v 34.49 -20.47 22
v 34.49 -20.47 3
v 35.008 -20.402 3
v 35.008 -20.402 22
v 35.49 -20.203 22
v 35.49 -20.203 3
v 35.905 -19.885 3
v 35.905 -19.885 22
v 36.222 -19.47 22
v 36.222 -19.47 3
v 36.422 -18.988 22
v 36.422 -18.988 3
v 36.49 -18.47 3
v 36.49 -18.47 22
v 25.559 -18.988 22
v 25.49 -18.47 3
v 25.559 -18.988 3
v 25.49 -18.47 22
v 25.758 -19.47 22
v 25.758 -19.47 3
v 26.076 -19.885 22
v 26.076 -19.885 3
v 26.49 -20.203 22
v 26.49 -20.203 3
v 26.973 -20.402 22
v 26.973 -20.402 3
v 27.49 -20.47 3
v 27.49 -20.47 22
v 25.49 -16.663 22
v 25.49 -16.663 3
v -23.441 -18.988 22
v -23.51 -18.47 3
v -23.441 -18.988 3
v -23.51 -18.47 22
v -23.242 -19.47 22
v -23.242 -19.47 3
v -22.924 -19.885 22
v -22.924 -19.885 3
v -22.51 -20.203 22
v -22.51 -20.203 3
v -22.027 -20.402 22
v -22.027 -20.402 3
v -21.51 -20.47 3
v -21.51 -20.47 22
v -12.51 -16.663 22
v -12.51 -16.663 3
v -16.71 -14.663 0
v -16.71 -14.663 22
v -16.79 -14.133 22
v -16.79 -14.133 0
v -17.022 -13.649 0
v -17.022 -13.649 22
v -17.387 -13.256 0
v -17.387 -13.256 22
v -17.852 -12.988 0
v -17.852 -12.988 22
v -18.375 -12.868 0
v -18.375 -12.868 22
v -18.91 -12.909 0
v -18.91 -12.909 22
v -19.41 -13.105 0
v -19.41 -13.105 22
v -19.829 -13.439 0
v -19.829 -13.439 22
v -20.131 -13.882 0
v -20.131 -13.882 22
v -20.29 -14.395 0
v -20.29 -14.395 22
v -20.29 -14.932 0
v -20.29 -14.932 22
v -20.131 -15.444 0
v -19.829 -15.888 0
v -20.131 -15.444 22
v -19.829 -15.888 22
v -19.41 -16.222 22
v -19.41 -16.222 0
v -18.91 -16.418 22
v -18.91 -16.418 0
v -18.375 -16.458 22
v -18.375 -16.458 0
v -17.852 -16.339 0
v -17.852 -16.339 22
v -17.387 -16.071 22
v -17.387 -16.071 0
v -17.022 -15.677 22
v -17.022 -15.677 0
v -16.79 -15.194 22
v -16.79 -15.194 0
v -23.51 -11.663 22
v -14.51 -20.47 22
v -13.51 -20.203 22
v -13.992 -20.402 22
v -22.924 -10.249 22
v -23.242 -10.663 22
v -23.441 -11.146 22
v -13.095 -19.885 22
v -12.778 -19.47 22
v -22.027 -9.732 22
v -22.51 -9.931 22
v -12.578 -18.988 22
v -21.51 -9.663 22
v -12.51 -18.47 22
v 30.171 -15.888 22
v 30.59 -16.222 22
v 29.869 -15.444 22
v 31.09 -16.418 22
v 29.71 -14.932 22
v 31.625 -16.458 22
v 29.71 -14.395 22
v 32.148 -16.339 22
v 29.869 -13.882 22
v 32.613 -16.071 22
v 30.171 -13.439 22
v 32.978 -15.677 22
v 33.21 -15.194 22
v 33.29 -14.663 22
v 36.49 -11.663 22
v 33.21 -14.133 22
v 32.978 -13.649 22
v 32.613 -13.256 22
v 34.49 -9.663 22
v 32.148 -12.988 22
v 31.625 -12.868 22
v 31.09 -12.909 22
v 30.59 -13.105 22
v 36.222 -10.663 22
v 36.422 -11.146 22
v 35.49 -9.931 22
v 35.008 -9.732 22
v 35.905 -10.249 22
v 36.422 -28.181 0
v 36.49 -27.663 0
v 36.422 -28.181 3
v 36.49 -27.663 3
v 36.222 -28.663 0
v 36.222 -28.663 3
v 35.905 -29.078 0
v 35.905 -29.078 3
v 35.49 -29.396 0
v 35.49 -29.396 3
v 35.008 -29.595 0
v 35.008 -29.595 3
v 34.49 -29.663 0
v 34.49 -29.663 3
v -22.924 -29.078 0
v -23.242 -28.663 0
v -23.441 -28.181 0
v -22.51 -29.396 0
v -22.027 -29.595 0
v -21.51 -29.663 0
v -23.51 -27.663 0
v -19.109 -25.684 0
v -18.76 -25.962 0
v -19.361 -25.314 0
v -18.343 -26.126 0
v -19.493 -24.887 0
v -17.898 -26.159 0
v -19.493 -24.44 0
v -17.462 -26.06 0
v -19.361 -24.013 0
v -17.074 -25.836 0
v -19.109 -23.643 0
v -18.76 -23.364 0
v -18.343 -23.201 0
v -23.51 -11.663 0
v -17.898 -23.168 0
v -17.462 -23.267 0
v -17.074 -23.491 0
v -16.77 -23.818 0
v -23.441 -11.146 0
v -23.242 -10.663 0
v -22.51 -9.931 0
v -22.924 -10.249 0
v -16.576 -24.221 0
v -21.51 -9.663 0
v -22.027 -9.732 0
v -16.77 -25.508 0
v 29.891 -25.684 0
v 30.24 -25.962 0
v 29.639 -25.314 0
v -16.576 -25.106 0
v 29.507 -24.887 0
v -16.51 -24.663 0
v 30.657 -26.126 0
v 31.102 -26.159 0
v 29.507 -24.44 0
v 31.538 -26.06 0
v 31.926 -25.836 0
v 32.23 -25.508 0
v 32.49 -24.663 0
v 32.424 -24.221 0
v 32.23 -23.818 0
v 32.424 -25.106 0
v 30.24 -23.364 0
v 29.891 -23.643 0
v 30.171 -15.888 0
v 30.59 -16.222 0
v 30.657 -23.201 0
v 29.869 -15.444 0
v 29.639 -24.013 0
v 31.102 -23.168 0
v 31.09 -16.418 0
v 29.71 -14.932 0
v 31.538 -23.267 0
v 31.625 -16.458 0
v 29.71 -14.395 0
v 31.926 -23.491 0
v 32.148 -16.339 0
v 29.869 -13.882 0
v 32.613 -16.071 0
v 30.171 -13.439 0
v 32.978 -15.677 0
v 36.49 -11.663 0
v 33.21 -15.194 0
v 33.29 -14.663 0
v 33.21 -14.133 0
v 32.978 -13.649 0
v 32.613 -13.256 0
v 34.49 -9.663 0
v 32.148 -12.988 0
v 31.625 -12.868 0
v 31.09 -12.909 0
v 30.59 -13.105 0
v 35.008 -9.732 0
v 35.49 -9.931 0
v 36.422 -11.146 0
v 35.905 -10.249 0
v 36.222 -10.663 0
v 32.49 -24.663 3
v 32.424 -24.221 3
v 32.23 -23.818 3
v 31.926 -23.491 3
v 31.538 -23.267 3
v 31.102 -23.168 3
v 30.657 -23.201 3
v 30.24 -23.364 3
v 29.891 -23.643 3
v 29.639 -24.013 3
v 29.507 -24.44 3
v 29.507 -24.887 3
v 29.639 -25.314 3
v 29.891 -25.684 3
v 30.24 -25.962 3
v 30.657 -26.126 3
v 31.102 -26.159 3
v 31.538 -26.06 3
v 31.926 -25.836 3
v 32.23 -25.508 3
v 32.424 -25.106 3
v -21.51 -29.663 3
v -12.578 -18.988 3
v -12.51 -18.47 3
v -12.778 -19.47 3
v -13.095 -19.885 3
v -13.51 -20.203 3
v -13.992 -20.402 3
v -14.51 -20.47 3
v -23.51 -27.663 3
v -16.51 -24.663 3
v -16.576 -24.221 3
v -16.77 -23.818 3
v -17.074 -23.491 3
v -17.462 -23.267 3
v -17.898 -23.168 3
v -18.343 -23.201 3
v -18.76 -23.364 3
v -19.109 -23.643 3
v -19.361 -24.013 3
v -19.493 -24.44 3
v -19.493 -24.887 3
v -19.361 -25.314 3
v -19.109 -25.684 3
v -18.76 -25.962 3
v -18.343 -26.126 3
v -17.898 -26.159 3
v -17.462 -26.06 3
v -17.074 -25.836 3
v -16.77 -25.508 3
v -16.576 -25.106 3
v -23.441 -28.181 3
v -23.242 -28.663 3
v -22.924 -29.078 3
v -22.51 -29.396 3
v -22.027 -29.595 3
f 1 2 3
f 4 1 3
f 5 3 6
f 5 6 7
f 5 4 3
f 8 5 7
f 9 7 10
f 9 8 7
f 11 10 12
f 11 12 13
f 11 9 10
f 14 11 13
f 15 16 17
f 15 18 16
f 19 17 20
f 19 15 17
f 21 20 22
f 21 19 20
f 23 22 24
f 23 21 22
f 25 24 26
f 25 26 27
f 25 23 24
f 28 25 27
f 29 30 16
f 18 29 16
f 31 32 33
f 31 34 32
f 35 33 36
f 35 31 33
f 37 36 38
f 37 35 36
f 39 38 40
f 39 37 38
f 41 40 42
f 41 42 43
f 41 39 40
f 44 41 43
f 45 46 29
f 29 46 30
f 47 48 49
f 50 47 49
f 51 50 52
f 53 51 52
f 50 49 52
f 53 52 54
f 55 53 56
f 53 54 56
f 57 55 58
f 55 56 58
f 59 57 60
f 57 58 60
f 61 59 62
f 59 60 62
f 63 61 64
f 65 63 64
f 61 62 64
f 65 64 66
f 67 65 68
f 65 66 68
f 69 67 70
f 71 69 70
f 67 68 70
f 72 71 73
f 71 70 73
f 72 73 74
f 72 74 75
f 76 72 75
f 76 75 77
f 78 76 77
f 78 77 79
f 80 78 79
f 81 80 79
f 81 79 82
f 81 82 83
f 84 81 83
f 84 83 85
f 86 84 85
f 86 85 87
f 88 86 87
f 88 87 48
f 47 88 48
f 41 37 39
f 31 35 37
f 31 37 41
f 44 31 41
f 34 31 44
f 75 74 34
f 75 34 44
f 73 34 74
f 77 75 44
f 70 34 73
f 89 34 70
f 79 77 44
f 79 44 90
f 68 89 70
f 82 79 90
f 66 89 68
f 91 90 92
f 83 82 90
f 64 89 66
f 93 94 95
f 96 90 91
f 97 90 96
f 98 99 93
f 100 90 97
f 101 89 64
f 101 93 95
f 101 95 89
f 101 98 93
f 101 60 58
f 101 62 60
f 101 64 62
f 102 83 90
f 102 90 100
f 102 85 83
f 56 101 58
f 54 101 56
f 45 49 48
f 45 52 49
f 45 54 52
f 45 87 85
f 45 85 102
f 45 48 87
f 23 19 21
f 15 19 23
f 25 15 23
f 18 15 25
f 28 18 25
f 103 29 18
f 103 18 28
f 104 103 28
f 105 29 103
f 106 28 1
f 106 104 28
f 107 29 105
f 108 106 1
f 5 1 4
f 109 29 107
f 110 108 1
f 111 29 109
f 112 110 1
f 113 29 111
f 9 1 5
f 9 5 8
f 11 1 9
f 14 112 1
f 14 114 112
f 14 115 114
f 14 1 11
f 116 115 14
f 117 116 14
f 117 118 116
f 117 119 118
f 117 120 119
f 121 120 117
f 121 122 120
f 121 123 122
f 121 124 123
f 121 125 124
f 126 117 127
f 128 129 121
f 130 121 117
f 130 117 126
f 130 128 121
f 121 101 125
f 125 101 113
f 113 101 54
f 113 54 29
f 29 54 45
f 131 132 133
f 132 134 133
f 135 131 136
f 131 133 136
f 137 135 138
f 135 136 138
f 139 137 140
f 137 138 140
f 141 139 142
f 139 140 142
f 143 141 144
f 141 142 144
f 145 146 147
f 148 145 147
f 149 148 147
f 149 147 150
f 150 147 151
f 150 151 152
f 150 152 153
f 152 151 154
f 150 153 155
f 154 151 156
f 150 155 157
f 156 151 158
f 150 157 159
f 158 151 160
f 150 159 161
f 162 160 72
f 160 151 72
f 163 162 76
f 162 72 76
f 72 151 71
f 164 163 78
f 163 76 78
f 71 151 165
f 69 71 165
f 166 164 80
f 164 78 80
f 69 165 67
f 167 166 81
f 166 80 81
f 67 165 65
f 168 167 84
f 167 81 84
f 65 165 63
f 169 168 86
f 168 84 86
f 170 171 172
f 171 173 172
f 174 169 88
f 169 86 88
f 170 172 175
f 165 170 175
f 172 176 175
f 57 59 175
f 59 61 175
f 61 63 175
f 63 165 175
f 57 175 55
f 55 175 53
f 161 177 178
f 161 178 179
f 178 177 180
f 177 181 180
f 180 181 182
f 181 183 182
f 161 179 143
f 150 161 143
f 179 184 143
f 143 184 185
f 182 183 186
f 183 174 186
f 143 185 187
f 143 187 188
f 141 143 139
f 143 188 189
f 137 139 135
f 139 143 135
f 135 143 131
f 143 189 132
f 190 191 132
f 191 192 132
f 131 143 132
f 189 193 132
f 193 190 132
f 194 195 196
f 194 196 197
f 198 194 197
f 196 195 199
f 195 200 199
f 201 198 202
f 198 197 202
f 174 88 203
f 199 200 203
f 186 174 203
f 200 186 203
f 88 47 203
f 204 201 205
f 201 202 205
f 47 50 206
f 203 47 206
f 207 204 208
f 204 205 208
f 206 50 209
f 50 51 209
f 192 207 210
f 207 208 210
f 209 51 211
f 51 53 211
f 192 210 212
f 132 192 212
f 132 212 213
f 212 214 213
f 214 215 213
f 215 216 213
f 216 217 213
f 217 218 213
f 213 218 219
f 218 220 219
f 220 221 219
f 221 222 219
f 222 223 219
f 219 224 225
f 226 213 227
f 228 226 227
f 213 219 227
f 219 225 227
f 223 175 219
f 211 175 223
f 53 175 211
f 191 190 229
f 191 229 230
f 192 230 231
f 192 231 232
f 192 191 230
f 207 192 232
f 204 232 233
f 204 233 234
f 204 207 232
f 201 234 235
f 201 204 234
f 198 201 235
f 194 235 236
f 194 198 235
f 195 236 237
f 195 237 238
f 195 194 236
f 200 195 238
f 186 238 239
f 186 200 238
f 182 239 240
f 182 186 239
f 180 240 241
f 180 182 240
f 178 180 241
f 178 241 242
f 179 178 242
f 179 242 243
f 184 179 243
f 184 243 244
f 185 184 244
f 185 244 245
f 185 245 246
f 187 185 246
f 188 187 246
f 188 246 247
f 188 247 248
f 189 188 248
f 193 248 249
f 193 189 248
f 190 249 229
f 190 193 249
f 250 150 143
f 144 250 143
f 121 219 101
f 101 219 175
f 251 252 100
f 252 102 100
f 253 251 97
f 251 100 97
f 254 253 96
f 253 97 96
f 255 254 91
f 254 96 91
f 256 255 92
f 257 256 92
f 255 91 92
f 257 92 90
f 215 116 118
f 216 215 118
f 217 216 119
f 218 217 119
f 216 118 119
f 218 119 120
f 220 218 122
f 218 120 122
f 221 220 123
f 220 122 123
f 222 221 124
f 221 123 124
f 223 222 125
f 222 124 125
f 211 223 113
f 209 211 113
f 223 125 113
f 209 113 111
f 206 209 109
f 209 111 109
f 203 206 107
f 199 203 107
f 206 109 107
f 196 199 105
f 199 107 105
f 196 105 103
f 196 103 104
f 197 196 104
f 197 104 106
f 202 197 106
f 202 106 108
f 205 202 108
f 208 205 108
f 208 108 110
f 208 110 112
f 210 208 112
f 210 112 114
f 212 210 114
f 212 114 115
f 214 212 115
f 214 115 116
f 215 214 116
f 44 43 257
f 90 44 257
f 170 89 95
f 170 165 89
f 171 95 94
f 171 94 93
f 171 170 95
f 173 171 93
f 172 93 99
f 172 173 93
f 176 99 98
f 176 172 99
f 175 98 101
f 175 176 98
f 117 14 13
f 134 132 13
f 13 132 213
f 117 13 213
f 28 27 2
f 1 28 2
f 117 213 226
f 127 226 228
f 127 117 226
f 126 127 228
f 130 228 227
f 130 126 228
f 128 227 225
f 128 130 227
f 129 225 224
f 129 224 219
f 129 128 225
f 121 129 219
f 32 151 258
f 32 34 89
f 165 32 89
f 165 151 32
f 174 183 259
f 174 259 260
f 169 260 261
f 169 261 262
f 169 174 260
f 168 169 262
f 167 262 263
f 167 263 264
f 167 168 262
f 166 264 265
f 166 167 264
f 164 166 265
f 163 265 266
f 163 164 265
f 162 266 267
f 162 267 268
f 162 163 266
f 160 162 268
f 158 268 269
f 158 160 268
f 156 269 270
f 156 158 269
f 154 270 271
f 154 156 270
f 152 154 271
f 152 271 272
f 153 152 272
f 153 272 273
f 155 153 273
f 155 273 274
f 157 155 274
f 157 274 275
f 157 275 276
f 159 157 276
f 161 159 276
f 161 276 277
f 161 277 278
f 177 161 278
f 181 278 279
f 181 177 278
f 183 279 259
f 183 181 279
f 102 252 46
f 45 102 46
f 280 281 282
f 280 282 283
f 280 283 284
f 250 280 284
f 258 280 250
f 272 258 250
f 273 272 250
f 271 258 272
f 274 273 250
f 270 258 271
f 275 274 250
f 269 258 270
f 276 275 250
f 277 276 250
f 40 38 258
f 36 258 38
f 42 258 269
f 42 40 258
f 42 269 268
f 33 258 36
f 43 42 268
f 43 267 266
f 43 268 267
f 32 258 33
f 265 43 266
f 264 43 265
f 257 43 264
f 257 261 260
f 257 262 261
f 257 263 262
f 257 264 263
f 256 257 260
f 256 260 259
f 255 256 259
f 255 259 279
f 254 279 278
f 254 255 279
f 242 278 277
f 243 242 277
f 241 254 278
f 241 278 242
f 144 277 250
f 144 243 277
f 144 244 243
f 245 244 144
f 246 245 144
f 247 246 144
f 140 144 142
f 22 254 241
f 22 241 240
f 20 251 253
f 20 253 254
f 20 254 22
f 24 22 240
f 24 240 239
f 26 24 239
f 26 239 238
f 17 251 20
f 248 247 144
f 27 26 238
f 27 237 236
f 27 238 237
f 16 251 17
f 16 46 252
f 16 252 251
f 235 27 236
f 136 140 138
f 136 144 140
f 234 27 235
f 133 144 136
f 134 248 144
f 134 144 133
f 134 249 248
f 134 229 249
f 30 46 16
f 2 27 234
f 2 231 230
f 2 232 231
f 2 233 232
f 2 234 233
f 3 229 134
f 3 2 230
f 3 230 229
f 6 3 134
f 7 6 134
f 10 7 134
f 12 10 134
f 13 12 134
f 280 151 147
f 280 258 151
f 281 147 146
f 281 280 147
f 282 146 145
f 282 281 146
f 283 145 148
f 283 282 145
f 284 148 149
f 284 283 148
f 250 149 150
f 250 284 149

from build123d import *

# Parameters (mm, degrees)
SKETCH_1_W          = 60
SKETCH_1_H          = 20
SKETCH_1_R          = 1.5
EXTRUDE_2_DEPTH     = 3
EXTRUDE_3_DEPTH     = 19
SKETCH_3_R          = 1.8
CUT_EXTRUDE_1_DEPTH = 52.917907506
FILLET_1_R          = 2


with BuildPart() as part:
    # ｽｹｯﾁ1 → ﾎﾞｽ - 押し出し2 (new body)
    with BuildSketch(Plane.XY):
        with Locations((6.490384615, -19.663461538)):
            Rectangle(SKETCH_1_W, SKETCH_1_H)
        with Locations((30.990384615, -24.663461538)):
            Circle(SKETCH_1_R, mode=Mode.SUBTRACT)
        with Locations((-18.009615385, -24.663461538)):
            Circle(SKETCH_1_R, mode=Mode.SUBTRACT)
    extrude(amount=EXTRUDE_2_DEPTH)

    # ｽｹｯﾁ2 → ﾎﾞｽ - 押し出し3 (add)
    with BuildSketch(Plane.XY.offset(3)):
        Polygon((6.490384615, -16.663461538), (25.490384615, -16.663461538), (25.490384615, -20.47046126), (36.490384615, -20.47046126), (36.490384615, -9.663461538), (-23.509615385, -9.663461538), (-23.509615385, -20.47046126), (-12.509615385, -20.47046126), (-12.509615385, -16.663461538), align=None)
    extrude(amount=EXTRUDE_3_DEPTH)

    # ｽｹｯﾁ3 → ｶｯﾄ - 押し出し1 (cut, through all)
    with BuildSketch(Plane.XY.offset(22)):
        with Locations((31.490384615, -14.663461538)):
            Circle(SKETCH_3_R)
        with Locations((-18.509615385, -14.663461538)):
            Circle(SKETCH_3_R)
    extrude(amount=-CUT_EXTRUDE_1_DEPTH, mode=Mode.SUBTRACT)

    # ﾌｨﾚｯﾄ1
    fillet_1_edges = [part.edges().sort_by_distance(p)[0] for p in [
        (25.490384615, -20.47046126, 12.5),
        (36.490384615, -20.47046126, 12.5),
        (-23.509615385, -20.47046126, 12.5),
        (-12.509615385, -20.47046126, 12.5),
        (-23.509615385, -9.663461538, 11),
        (36.490384615, -9.663461538, 11),
        (36.490384615, -29.663461538, 1.5),
        (-23.509615385, -29.663461538, 1.5),
    ]]
    fillet(fillet_1_edges, radius=FILLET_1_R)


solid = part.part
